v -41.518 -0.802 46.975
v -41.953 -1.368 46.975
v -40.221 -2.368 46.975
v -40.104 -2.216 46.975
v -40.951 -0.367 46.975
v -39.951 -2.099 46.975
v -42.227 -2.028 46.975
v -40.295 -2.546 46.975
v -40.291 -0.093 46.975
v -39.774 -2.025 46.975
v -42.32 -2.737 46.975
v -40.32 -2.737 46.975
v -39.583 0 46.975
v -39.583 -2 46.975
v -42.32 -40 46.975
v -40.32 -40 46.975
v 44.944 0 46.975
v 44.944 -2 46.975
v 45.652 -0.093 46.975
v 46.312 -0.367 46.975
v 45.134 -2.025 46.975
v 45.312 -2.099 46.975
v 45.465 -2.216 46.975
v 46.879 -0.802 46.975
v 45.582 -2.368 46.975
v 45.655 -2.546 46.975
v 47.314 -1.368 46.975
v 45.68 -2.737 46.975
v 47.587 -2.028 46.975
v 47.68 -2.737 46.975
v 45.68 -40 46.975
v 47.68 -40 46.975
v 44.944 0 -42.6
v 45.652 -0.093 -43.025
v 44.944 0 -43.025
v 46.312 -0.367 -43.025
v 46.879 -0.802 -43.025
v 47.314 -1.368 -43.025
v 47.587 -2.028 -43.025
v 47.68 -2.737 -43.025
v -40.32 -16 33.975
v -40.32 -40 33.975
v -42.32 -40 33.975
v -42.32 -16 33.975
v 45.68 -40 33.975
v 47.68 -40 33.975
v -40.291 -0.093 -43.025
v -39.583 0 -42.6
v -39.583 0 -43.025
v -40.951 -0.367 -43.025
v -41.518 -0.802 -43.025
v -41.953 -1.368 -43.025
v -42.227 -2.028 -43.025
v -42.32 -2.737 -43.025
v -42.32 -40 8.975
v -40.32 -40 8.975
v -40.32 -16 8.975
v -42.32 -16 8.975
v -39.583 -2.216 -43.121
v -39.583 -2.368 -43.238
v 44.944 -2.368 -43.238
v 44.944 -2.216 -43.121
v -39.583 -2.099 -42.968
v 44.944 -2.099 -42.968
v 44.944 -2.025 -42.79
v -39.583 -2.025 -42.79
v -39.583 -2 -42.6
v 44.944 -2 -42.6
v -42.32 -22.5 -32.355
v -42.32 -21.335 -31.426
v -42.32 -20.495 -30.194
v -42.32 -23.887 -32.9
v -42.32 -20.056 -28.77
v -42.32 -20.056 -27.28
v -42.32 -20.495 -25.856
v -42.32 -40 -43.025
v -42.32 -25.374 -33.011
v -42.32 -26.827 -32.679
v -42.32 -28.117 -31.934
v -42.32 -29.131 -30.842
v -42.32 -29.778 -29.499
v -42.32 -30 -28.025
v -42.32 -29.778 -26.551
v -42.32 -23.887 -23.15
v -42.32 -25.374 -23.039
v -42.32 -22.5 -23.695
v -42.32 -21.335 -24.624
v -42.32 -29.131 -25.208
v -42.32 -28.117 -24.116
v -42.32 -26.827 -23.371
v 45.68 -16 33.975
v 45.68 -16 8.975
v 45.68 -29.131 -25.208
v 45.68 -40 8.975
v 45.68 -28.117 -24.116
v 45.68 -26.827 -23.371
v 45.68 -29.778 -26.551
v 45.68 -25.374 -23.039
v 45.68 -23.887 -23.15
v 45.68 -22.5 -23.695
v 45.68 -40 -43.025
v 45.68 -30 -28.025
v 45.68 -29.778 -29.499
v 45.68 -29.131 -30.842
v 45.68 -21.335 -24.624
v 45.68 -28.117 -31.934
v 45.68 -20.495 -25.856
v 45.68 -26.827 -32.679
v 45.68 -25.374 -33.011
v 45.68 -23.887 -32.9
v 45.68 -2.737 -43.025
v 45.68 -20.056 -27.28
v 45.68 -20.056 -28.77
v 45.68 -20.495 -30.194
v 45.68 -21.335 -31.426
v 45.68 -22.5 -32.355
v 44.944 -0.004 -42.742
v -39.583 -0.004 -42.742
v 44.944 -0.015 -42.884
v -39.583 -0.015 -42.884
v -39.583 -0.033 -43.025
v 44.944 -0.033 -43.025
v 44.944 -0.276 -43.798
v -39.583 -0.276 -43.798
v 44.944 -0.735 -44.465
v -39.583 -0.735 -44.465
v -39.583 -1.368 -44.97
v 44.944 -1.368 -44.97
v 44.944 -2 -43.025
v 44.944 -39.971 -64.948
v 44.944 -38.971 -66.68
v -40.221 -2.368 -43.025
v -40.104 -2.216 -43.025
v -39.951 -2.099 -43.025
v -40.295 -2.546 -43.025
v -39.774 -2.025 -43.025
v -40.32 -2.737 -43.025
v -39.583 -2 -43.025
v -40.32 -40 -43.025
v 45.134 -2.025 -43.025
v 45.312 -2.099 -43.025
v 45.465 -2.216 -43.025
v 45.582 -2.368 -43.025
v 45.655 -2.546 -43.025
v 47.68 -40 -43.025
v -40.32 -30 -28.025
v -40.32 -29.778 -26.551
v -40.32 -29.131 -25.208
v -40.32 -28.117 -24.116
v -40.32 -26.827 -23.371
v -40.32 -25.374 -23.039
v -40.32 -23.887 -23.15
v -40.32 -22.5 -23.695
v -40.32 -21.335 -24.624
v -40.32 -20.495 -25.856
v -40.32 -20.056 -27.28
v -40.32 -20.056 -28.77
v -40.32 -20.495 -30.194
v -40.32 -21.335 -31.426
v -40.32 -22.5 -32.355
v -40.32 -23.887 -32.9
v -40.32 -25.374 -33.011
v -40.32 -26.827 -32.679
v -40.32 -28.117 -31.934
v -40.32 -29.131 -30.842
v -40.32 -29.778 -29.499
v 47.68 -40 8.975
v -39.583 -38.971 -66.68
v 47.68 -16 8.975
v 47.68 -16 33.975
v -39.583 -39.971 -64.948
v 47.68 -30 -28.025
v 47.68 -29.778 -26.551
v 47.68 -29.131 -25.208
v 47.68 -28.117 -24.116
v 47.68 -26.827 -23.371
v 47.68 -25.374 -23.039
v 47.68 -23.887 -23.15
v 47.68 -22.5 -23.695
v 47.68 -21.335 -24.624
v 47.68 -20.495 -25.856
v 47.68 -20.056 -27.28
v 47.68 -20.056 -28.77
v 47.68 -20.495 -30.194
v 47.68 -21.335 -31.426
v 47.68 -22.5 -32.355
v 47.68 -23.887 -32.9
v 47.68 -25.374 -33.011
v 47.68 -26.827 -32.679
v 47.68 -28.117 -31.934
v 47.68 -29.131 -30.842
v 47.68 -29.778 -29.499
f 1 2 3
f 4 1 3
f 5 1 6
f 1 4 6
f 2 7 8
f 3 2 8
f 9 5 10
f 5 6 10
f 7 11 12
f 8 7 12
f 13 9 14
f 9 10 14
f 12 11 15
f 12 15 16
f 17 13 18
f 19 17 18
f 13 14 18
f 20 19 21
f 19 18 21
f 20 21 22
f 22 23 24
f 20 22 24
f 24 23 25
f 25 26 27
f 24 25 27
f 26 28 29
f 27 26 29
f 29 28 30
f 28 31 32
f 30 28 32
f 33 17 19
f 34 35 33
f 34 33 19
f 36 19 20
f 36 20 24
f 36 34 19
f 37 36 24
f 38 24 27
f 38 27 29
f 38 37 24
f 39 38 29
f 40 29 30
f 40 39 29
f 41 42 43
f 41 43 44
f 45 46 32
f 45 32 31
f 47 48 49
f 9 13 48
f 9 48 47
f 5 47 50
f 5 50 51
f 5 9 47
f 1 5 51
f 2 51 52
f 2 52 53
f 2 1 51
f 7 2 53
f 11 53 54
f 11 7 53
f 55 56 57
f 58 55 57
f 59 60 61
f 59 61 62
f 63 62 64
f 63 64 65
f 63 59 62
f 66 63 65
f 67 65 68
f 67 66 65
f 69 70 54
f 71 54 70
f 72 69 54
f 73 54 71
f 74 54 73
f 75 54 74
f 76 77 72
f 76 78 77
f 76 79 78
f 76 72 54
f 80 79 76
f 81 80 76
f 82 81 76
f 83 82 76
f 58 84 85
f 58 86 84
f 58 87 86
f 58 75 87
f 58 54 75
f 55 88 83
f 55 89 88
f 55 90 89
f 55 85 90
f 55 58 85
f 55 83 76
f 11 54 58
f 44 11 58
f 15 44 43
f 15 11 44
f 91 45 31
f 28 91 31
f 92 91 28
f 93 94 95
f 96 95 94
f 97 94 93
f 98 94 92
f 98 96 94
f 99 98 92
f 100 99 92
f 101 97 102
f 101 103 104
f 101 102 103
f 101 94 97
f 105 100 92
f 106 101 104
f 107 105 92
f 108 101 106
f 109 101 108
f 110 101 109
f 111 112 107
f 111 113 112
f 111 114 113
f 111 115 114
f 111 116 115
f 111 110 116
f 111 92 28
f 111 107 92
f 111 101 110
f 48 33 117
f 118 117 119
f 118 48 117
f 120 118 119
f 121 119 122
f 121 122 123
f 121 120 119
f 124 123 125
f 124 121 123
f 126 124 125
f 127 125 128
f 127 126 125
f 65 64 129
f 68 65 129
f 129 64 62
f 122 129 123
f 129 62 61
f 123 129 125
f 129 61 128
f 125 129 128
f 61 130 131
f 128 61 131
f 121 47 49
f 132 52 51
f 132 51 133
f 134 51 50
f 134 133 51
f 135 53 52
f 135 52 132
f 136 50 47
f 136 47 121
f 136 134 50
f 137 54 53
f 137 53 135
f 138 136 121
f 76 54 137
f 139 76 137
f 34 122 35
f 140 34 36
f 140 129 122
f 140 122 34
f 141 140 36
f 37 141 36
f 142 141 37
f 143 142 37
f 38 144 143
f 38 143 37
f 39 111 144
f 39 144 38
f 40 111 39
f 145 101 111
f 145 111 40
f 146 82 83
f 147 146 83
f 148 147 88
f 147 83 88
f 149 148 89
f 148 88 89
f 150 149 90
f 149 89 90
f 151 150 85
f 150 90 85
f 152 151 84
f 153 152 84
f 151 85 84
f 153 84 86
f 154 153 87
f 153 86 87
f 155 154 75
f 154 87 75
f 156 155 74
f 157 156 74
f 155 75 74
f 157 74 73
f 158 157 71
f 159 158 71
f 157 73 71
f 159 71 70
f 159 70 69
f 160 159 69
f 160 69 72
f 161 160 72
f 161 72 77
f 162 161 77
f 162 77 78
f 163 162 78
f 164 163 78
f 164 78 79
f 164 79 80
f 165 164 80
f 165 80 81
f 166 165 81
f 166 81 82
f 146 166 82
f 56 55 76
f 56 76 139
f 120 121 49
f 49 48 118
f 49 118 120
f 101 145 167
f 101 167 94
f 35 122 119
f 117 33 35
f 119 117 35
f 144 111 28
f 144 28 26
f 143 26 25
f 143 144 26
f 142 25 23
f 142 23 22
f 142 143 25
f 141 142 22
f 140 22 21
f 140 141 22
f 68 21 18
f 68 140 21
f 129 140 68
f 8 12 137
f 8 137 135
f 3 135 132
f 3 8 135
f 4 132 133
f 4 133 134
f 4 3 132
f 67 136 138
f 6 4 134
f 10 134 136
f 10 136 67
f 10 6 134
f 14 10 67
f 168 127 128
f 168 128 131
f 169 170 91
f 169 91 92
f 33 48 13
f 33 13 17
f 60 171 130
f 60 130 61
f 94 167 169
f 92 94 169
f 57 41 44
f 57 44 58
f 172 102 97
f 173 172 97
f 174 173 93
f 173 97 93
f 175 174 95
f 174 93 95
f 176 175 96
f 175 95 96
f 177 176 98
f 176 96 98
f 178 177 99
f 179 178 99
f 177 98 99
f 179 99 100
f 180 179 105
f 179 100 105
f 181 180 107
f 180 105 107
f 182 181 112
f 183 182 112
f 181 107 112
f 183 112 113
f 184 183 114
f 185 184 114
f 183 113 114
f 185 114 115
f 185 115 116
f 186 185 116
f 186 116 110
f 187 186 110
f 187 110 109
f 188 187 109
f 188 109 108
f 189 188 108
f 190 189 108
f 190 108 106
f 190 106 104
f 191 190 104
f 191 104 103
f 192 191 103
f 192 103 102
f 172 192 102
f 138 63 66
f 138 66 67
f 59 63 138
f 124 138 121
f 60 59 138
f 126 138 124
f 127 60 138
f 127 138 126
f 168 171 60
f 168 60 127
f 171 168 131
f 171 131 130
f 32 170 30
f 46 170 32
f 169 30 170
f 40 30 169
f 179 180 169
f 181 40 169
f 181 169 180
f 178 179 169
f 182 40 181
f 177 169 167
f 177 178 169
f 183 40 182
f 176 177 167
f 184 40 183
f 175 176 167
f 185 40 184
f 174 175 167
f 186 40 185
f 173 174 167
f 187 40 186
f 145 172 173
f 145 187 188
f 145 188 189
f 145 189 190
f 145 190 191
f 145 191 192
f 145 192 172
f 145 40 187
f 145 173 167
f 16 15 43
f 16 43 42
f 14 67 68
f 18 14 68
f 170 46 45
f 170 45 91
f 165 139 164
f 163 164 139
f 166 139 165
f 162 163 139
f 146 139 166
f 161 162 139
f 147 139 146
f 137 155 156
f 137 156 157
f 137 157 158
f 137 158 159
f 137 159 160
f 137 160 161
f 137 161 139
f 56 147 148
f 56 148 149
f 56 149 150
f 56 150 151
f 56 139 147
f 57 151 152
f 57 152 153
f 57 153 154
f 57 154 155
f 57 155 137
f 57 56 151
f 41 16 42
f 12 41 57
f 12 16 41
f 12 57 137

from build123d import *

# Parameters (mm, degrees)
SKETCH1_W                    = 90
SKETCH1_H                    = 90
BASE_FLANGE1_DEPTH           = 2
EDGE_FLANGE1_STRIP_W         = 9.4732
EDGE_FLANGE1_STRIP_H         = 2
EDGE_FLANGE1_STRIP_CUT_DEPTH = 90
EDGE_FLANGE1_DEPTH           = 90
EDGE_FLANGE3_STRIP_W         = 9.4732
EDGE_FLANGE3_STRIP_H         = 2
EDGE_FLANGE3_STRIP_CUT_DEPTH = 90
EDGE_FLANGE3_DEPTH           = 90
EDGE_FLANGE5_STRIP_CUT_DEPTH = 84.5268
EDGE_FLANGE5_DEPTH           = 84.5268
SKETCH25_W                   = 25
SKETCH25_H                   = 24
CUT_EXTRUDE1_DEPTH           = 119.937769086
SKETCH26_R                   = 5
CUT_EXTRUDE2_DEPTH           = 119.937769086


# Sheet-metal steps are written as plain solids
with BuildPart() as part:
    # Sketch1 → Base-Flange1 (new body)
    with BuildSketch(Plane(origin=(0, 0, 0), x_dir=(1, 0, 0), z_dir=(0, 1, 0))):
        with Locations((2.680250784, -1.97492163)):
            Rectangle(SKETCH1_W, SKETCH1_H)
    extrude(amount=-BASE_FLANGE1_DEPTH)

    # Edge-Flange1 strip (across the edge) → Edge-Flange1 strip cut (cut)
    with BuildSketch(Plane(origin=(-42.319749216, -2, 46.97492163), x_dir=(1, 0, 0), z_dir=(0, 0, -1))):
        with Locations((-2, -1)):
            Rectangle(EDGE_FLANGE1_STRIP_W, EDGE_FLANGE1_STRIP_H)
    extrude(amount=EDGE_FLANGE1_STRIP_CUT_DEPTH, mode=Mode.SUBTRACT)

    # Edge-Flange1 section (across the edge) → Edge-Flange1 (add)
    with BuildSketch(Plane(origin=(-42.319749216, -2, 46.97492163), x_dir=(1, 0, 0), z_dir=(0, 0, -1))):
        with BuildLine():
            Line((0, 0.7366), (0, 38))
            Line((0, 38), (2, 38))
            Line((2, 38), (2, 0.7366))
            ThreePointArc((2, 0.7366), (2.215745145, 0.215745145), (2.7366, 0))
            Line((2.7366, 0), (2.7366, -2))
            ThreePointArc((2.7366, -2), (0.801531583, -1.198468417), (0, 0.7366))
        make_face()
    extrude(amount=EDGE_FLANGE1_DEPTH)

    # Edge-Flange3 strip (across the edge) → Edge-Flange3 strip cut (cut)
    with BuildSketch(Plane(origin=(47.680250784, -2, -43.02507837), x_dir=(-1, 0, 0), z_dir=(0, 0, 1))):
        with Locations((-2, -1)):
            Rectangle(EDGE_FLANGE3_STRIP_W, EDGE_FLANGE3_STRIP_H)
    extrude(amount=EDGE_FLANGE3_STRIP_CUT_DEPTH, mode=Mode.SUBTRACT)

    # Edge-Flange3 section (across the edge) → Edge-Flange3 (add)
    with BuildSketch(Plane(origin=(47.680250784, -2, -43.02507837), x_dir=(-1, 0, 0), z_dir=(0, 0, 1))):
        with BuildLine():
            Line((0, 0.7366), (0, 38))
            Line((0, 38), (2, 38))
            Line((2, 38), (2, 0.7366))
            ThreePointArc((2, 0.7366), (2.215745145, 0.215745145), (2.7366, 0))
            Line((2.7366, 0), (2.7366, -2))
            ThreePointArc((2.7366, -2), (0.801531583, -1.198468417), (0, 0.7366))
        make_face()
    extrude(amount=EDGE_FLANGE3_DEPTH)

    # Edge-Flange5 strip (across the edge) → Edge-Flange5 strip cut (cut)
    with BuildSketch(Plane(origin=(-39.583149216, -2, -43.02507837), x_dir=(0, -0.5000000000000041, 0.8660254037844364), z_dir=(1, 0, 0))):
        Polygon((-8.835731855, 2.791911088), (-0.6317, -1.944688912), (0.3683, -0.212638104), (-7.835731855, 4.523961896), align=None)
    extrude(amount=EDGE_FLANGE5_STRIP_CUT_DEPTH, mode=Mode.SUBTRACT)

    # Edge-Flange5 section (across the edge) → Edge-Flange5 (add)
    with BuildSketch(Plane(origin=(-39.583149216, -2, -43.02507837), x_dir=(0, -0.5000000000000041, 0.8660254037844364), z_dir=(1, 0, 0))):
        with BuildLine():
            Line((-2, 0.425276208), (-2, 43.845299462))
            Line((-2, 43.845299462), (0, 43.845299462))
            Line((0, 43.845299462), (0, 0.425276208))
            ThreePointArc((0, 0.425276208), (0.098685688, 0.056976208), (0.3683, -0.212638104))
            Line((0.3683, -0.212638104), (-0.6317, -1.944688912))
            ThreePointArc((-0.6317, -1.944688912), (-1.63336512, -0.943023792), (-2, 0.425276208))
        make_face()
    extrude(amount=EDGE_FLANGE5_DEPTH)

    # Sketch25 → Cut-Extrude1 (cut, through all)
    with BuildSketch(Plane(origin=(47.680250784, 0, 0), x_dir=(0, 0, -1), z_dir=(1, 0, 0))):
        with Locations((-21.47492163, -28)):
            Rectangle(SKETCH25_W, SKETCH25_H)
    extrude(amount=-CUT_EXTRUDE1_DEPTH, mode=Mode.SUBTRACT)

    # Sketch26 → Cut-Extrude2 (cut, through all)
    with BuildSketch(Plane.ZY.offset(42.319749216)):
        with Locations(Location((-28.02507837, -25, 0), (0, 0, 270))):
            Circle(SKETCH26_R)
    extrude(amount=-CUT_EXTRUDE2_DEPTH, mode=Mode.SUBTRACT)


solid = part.part
